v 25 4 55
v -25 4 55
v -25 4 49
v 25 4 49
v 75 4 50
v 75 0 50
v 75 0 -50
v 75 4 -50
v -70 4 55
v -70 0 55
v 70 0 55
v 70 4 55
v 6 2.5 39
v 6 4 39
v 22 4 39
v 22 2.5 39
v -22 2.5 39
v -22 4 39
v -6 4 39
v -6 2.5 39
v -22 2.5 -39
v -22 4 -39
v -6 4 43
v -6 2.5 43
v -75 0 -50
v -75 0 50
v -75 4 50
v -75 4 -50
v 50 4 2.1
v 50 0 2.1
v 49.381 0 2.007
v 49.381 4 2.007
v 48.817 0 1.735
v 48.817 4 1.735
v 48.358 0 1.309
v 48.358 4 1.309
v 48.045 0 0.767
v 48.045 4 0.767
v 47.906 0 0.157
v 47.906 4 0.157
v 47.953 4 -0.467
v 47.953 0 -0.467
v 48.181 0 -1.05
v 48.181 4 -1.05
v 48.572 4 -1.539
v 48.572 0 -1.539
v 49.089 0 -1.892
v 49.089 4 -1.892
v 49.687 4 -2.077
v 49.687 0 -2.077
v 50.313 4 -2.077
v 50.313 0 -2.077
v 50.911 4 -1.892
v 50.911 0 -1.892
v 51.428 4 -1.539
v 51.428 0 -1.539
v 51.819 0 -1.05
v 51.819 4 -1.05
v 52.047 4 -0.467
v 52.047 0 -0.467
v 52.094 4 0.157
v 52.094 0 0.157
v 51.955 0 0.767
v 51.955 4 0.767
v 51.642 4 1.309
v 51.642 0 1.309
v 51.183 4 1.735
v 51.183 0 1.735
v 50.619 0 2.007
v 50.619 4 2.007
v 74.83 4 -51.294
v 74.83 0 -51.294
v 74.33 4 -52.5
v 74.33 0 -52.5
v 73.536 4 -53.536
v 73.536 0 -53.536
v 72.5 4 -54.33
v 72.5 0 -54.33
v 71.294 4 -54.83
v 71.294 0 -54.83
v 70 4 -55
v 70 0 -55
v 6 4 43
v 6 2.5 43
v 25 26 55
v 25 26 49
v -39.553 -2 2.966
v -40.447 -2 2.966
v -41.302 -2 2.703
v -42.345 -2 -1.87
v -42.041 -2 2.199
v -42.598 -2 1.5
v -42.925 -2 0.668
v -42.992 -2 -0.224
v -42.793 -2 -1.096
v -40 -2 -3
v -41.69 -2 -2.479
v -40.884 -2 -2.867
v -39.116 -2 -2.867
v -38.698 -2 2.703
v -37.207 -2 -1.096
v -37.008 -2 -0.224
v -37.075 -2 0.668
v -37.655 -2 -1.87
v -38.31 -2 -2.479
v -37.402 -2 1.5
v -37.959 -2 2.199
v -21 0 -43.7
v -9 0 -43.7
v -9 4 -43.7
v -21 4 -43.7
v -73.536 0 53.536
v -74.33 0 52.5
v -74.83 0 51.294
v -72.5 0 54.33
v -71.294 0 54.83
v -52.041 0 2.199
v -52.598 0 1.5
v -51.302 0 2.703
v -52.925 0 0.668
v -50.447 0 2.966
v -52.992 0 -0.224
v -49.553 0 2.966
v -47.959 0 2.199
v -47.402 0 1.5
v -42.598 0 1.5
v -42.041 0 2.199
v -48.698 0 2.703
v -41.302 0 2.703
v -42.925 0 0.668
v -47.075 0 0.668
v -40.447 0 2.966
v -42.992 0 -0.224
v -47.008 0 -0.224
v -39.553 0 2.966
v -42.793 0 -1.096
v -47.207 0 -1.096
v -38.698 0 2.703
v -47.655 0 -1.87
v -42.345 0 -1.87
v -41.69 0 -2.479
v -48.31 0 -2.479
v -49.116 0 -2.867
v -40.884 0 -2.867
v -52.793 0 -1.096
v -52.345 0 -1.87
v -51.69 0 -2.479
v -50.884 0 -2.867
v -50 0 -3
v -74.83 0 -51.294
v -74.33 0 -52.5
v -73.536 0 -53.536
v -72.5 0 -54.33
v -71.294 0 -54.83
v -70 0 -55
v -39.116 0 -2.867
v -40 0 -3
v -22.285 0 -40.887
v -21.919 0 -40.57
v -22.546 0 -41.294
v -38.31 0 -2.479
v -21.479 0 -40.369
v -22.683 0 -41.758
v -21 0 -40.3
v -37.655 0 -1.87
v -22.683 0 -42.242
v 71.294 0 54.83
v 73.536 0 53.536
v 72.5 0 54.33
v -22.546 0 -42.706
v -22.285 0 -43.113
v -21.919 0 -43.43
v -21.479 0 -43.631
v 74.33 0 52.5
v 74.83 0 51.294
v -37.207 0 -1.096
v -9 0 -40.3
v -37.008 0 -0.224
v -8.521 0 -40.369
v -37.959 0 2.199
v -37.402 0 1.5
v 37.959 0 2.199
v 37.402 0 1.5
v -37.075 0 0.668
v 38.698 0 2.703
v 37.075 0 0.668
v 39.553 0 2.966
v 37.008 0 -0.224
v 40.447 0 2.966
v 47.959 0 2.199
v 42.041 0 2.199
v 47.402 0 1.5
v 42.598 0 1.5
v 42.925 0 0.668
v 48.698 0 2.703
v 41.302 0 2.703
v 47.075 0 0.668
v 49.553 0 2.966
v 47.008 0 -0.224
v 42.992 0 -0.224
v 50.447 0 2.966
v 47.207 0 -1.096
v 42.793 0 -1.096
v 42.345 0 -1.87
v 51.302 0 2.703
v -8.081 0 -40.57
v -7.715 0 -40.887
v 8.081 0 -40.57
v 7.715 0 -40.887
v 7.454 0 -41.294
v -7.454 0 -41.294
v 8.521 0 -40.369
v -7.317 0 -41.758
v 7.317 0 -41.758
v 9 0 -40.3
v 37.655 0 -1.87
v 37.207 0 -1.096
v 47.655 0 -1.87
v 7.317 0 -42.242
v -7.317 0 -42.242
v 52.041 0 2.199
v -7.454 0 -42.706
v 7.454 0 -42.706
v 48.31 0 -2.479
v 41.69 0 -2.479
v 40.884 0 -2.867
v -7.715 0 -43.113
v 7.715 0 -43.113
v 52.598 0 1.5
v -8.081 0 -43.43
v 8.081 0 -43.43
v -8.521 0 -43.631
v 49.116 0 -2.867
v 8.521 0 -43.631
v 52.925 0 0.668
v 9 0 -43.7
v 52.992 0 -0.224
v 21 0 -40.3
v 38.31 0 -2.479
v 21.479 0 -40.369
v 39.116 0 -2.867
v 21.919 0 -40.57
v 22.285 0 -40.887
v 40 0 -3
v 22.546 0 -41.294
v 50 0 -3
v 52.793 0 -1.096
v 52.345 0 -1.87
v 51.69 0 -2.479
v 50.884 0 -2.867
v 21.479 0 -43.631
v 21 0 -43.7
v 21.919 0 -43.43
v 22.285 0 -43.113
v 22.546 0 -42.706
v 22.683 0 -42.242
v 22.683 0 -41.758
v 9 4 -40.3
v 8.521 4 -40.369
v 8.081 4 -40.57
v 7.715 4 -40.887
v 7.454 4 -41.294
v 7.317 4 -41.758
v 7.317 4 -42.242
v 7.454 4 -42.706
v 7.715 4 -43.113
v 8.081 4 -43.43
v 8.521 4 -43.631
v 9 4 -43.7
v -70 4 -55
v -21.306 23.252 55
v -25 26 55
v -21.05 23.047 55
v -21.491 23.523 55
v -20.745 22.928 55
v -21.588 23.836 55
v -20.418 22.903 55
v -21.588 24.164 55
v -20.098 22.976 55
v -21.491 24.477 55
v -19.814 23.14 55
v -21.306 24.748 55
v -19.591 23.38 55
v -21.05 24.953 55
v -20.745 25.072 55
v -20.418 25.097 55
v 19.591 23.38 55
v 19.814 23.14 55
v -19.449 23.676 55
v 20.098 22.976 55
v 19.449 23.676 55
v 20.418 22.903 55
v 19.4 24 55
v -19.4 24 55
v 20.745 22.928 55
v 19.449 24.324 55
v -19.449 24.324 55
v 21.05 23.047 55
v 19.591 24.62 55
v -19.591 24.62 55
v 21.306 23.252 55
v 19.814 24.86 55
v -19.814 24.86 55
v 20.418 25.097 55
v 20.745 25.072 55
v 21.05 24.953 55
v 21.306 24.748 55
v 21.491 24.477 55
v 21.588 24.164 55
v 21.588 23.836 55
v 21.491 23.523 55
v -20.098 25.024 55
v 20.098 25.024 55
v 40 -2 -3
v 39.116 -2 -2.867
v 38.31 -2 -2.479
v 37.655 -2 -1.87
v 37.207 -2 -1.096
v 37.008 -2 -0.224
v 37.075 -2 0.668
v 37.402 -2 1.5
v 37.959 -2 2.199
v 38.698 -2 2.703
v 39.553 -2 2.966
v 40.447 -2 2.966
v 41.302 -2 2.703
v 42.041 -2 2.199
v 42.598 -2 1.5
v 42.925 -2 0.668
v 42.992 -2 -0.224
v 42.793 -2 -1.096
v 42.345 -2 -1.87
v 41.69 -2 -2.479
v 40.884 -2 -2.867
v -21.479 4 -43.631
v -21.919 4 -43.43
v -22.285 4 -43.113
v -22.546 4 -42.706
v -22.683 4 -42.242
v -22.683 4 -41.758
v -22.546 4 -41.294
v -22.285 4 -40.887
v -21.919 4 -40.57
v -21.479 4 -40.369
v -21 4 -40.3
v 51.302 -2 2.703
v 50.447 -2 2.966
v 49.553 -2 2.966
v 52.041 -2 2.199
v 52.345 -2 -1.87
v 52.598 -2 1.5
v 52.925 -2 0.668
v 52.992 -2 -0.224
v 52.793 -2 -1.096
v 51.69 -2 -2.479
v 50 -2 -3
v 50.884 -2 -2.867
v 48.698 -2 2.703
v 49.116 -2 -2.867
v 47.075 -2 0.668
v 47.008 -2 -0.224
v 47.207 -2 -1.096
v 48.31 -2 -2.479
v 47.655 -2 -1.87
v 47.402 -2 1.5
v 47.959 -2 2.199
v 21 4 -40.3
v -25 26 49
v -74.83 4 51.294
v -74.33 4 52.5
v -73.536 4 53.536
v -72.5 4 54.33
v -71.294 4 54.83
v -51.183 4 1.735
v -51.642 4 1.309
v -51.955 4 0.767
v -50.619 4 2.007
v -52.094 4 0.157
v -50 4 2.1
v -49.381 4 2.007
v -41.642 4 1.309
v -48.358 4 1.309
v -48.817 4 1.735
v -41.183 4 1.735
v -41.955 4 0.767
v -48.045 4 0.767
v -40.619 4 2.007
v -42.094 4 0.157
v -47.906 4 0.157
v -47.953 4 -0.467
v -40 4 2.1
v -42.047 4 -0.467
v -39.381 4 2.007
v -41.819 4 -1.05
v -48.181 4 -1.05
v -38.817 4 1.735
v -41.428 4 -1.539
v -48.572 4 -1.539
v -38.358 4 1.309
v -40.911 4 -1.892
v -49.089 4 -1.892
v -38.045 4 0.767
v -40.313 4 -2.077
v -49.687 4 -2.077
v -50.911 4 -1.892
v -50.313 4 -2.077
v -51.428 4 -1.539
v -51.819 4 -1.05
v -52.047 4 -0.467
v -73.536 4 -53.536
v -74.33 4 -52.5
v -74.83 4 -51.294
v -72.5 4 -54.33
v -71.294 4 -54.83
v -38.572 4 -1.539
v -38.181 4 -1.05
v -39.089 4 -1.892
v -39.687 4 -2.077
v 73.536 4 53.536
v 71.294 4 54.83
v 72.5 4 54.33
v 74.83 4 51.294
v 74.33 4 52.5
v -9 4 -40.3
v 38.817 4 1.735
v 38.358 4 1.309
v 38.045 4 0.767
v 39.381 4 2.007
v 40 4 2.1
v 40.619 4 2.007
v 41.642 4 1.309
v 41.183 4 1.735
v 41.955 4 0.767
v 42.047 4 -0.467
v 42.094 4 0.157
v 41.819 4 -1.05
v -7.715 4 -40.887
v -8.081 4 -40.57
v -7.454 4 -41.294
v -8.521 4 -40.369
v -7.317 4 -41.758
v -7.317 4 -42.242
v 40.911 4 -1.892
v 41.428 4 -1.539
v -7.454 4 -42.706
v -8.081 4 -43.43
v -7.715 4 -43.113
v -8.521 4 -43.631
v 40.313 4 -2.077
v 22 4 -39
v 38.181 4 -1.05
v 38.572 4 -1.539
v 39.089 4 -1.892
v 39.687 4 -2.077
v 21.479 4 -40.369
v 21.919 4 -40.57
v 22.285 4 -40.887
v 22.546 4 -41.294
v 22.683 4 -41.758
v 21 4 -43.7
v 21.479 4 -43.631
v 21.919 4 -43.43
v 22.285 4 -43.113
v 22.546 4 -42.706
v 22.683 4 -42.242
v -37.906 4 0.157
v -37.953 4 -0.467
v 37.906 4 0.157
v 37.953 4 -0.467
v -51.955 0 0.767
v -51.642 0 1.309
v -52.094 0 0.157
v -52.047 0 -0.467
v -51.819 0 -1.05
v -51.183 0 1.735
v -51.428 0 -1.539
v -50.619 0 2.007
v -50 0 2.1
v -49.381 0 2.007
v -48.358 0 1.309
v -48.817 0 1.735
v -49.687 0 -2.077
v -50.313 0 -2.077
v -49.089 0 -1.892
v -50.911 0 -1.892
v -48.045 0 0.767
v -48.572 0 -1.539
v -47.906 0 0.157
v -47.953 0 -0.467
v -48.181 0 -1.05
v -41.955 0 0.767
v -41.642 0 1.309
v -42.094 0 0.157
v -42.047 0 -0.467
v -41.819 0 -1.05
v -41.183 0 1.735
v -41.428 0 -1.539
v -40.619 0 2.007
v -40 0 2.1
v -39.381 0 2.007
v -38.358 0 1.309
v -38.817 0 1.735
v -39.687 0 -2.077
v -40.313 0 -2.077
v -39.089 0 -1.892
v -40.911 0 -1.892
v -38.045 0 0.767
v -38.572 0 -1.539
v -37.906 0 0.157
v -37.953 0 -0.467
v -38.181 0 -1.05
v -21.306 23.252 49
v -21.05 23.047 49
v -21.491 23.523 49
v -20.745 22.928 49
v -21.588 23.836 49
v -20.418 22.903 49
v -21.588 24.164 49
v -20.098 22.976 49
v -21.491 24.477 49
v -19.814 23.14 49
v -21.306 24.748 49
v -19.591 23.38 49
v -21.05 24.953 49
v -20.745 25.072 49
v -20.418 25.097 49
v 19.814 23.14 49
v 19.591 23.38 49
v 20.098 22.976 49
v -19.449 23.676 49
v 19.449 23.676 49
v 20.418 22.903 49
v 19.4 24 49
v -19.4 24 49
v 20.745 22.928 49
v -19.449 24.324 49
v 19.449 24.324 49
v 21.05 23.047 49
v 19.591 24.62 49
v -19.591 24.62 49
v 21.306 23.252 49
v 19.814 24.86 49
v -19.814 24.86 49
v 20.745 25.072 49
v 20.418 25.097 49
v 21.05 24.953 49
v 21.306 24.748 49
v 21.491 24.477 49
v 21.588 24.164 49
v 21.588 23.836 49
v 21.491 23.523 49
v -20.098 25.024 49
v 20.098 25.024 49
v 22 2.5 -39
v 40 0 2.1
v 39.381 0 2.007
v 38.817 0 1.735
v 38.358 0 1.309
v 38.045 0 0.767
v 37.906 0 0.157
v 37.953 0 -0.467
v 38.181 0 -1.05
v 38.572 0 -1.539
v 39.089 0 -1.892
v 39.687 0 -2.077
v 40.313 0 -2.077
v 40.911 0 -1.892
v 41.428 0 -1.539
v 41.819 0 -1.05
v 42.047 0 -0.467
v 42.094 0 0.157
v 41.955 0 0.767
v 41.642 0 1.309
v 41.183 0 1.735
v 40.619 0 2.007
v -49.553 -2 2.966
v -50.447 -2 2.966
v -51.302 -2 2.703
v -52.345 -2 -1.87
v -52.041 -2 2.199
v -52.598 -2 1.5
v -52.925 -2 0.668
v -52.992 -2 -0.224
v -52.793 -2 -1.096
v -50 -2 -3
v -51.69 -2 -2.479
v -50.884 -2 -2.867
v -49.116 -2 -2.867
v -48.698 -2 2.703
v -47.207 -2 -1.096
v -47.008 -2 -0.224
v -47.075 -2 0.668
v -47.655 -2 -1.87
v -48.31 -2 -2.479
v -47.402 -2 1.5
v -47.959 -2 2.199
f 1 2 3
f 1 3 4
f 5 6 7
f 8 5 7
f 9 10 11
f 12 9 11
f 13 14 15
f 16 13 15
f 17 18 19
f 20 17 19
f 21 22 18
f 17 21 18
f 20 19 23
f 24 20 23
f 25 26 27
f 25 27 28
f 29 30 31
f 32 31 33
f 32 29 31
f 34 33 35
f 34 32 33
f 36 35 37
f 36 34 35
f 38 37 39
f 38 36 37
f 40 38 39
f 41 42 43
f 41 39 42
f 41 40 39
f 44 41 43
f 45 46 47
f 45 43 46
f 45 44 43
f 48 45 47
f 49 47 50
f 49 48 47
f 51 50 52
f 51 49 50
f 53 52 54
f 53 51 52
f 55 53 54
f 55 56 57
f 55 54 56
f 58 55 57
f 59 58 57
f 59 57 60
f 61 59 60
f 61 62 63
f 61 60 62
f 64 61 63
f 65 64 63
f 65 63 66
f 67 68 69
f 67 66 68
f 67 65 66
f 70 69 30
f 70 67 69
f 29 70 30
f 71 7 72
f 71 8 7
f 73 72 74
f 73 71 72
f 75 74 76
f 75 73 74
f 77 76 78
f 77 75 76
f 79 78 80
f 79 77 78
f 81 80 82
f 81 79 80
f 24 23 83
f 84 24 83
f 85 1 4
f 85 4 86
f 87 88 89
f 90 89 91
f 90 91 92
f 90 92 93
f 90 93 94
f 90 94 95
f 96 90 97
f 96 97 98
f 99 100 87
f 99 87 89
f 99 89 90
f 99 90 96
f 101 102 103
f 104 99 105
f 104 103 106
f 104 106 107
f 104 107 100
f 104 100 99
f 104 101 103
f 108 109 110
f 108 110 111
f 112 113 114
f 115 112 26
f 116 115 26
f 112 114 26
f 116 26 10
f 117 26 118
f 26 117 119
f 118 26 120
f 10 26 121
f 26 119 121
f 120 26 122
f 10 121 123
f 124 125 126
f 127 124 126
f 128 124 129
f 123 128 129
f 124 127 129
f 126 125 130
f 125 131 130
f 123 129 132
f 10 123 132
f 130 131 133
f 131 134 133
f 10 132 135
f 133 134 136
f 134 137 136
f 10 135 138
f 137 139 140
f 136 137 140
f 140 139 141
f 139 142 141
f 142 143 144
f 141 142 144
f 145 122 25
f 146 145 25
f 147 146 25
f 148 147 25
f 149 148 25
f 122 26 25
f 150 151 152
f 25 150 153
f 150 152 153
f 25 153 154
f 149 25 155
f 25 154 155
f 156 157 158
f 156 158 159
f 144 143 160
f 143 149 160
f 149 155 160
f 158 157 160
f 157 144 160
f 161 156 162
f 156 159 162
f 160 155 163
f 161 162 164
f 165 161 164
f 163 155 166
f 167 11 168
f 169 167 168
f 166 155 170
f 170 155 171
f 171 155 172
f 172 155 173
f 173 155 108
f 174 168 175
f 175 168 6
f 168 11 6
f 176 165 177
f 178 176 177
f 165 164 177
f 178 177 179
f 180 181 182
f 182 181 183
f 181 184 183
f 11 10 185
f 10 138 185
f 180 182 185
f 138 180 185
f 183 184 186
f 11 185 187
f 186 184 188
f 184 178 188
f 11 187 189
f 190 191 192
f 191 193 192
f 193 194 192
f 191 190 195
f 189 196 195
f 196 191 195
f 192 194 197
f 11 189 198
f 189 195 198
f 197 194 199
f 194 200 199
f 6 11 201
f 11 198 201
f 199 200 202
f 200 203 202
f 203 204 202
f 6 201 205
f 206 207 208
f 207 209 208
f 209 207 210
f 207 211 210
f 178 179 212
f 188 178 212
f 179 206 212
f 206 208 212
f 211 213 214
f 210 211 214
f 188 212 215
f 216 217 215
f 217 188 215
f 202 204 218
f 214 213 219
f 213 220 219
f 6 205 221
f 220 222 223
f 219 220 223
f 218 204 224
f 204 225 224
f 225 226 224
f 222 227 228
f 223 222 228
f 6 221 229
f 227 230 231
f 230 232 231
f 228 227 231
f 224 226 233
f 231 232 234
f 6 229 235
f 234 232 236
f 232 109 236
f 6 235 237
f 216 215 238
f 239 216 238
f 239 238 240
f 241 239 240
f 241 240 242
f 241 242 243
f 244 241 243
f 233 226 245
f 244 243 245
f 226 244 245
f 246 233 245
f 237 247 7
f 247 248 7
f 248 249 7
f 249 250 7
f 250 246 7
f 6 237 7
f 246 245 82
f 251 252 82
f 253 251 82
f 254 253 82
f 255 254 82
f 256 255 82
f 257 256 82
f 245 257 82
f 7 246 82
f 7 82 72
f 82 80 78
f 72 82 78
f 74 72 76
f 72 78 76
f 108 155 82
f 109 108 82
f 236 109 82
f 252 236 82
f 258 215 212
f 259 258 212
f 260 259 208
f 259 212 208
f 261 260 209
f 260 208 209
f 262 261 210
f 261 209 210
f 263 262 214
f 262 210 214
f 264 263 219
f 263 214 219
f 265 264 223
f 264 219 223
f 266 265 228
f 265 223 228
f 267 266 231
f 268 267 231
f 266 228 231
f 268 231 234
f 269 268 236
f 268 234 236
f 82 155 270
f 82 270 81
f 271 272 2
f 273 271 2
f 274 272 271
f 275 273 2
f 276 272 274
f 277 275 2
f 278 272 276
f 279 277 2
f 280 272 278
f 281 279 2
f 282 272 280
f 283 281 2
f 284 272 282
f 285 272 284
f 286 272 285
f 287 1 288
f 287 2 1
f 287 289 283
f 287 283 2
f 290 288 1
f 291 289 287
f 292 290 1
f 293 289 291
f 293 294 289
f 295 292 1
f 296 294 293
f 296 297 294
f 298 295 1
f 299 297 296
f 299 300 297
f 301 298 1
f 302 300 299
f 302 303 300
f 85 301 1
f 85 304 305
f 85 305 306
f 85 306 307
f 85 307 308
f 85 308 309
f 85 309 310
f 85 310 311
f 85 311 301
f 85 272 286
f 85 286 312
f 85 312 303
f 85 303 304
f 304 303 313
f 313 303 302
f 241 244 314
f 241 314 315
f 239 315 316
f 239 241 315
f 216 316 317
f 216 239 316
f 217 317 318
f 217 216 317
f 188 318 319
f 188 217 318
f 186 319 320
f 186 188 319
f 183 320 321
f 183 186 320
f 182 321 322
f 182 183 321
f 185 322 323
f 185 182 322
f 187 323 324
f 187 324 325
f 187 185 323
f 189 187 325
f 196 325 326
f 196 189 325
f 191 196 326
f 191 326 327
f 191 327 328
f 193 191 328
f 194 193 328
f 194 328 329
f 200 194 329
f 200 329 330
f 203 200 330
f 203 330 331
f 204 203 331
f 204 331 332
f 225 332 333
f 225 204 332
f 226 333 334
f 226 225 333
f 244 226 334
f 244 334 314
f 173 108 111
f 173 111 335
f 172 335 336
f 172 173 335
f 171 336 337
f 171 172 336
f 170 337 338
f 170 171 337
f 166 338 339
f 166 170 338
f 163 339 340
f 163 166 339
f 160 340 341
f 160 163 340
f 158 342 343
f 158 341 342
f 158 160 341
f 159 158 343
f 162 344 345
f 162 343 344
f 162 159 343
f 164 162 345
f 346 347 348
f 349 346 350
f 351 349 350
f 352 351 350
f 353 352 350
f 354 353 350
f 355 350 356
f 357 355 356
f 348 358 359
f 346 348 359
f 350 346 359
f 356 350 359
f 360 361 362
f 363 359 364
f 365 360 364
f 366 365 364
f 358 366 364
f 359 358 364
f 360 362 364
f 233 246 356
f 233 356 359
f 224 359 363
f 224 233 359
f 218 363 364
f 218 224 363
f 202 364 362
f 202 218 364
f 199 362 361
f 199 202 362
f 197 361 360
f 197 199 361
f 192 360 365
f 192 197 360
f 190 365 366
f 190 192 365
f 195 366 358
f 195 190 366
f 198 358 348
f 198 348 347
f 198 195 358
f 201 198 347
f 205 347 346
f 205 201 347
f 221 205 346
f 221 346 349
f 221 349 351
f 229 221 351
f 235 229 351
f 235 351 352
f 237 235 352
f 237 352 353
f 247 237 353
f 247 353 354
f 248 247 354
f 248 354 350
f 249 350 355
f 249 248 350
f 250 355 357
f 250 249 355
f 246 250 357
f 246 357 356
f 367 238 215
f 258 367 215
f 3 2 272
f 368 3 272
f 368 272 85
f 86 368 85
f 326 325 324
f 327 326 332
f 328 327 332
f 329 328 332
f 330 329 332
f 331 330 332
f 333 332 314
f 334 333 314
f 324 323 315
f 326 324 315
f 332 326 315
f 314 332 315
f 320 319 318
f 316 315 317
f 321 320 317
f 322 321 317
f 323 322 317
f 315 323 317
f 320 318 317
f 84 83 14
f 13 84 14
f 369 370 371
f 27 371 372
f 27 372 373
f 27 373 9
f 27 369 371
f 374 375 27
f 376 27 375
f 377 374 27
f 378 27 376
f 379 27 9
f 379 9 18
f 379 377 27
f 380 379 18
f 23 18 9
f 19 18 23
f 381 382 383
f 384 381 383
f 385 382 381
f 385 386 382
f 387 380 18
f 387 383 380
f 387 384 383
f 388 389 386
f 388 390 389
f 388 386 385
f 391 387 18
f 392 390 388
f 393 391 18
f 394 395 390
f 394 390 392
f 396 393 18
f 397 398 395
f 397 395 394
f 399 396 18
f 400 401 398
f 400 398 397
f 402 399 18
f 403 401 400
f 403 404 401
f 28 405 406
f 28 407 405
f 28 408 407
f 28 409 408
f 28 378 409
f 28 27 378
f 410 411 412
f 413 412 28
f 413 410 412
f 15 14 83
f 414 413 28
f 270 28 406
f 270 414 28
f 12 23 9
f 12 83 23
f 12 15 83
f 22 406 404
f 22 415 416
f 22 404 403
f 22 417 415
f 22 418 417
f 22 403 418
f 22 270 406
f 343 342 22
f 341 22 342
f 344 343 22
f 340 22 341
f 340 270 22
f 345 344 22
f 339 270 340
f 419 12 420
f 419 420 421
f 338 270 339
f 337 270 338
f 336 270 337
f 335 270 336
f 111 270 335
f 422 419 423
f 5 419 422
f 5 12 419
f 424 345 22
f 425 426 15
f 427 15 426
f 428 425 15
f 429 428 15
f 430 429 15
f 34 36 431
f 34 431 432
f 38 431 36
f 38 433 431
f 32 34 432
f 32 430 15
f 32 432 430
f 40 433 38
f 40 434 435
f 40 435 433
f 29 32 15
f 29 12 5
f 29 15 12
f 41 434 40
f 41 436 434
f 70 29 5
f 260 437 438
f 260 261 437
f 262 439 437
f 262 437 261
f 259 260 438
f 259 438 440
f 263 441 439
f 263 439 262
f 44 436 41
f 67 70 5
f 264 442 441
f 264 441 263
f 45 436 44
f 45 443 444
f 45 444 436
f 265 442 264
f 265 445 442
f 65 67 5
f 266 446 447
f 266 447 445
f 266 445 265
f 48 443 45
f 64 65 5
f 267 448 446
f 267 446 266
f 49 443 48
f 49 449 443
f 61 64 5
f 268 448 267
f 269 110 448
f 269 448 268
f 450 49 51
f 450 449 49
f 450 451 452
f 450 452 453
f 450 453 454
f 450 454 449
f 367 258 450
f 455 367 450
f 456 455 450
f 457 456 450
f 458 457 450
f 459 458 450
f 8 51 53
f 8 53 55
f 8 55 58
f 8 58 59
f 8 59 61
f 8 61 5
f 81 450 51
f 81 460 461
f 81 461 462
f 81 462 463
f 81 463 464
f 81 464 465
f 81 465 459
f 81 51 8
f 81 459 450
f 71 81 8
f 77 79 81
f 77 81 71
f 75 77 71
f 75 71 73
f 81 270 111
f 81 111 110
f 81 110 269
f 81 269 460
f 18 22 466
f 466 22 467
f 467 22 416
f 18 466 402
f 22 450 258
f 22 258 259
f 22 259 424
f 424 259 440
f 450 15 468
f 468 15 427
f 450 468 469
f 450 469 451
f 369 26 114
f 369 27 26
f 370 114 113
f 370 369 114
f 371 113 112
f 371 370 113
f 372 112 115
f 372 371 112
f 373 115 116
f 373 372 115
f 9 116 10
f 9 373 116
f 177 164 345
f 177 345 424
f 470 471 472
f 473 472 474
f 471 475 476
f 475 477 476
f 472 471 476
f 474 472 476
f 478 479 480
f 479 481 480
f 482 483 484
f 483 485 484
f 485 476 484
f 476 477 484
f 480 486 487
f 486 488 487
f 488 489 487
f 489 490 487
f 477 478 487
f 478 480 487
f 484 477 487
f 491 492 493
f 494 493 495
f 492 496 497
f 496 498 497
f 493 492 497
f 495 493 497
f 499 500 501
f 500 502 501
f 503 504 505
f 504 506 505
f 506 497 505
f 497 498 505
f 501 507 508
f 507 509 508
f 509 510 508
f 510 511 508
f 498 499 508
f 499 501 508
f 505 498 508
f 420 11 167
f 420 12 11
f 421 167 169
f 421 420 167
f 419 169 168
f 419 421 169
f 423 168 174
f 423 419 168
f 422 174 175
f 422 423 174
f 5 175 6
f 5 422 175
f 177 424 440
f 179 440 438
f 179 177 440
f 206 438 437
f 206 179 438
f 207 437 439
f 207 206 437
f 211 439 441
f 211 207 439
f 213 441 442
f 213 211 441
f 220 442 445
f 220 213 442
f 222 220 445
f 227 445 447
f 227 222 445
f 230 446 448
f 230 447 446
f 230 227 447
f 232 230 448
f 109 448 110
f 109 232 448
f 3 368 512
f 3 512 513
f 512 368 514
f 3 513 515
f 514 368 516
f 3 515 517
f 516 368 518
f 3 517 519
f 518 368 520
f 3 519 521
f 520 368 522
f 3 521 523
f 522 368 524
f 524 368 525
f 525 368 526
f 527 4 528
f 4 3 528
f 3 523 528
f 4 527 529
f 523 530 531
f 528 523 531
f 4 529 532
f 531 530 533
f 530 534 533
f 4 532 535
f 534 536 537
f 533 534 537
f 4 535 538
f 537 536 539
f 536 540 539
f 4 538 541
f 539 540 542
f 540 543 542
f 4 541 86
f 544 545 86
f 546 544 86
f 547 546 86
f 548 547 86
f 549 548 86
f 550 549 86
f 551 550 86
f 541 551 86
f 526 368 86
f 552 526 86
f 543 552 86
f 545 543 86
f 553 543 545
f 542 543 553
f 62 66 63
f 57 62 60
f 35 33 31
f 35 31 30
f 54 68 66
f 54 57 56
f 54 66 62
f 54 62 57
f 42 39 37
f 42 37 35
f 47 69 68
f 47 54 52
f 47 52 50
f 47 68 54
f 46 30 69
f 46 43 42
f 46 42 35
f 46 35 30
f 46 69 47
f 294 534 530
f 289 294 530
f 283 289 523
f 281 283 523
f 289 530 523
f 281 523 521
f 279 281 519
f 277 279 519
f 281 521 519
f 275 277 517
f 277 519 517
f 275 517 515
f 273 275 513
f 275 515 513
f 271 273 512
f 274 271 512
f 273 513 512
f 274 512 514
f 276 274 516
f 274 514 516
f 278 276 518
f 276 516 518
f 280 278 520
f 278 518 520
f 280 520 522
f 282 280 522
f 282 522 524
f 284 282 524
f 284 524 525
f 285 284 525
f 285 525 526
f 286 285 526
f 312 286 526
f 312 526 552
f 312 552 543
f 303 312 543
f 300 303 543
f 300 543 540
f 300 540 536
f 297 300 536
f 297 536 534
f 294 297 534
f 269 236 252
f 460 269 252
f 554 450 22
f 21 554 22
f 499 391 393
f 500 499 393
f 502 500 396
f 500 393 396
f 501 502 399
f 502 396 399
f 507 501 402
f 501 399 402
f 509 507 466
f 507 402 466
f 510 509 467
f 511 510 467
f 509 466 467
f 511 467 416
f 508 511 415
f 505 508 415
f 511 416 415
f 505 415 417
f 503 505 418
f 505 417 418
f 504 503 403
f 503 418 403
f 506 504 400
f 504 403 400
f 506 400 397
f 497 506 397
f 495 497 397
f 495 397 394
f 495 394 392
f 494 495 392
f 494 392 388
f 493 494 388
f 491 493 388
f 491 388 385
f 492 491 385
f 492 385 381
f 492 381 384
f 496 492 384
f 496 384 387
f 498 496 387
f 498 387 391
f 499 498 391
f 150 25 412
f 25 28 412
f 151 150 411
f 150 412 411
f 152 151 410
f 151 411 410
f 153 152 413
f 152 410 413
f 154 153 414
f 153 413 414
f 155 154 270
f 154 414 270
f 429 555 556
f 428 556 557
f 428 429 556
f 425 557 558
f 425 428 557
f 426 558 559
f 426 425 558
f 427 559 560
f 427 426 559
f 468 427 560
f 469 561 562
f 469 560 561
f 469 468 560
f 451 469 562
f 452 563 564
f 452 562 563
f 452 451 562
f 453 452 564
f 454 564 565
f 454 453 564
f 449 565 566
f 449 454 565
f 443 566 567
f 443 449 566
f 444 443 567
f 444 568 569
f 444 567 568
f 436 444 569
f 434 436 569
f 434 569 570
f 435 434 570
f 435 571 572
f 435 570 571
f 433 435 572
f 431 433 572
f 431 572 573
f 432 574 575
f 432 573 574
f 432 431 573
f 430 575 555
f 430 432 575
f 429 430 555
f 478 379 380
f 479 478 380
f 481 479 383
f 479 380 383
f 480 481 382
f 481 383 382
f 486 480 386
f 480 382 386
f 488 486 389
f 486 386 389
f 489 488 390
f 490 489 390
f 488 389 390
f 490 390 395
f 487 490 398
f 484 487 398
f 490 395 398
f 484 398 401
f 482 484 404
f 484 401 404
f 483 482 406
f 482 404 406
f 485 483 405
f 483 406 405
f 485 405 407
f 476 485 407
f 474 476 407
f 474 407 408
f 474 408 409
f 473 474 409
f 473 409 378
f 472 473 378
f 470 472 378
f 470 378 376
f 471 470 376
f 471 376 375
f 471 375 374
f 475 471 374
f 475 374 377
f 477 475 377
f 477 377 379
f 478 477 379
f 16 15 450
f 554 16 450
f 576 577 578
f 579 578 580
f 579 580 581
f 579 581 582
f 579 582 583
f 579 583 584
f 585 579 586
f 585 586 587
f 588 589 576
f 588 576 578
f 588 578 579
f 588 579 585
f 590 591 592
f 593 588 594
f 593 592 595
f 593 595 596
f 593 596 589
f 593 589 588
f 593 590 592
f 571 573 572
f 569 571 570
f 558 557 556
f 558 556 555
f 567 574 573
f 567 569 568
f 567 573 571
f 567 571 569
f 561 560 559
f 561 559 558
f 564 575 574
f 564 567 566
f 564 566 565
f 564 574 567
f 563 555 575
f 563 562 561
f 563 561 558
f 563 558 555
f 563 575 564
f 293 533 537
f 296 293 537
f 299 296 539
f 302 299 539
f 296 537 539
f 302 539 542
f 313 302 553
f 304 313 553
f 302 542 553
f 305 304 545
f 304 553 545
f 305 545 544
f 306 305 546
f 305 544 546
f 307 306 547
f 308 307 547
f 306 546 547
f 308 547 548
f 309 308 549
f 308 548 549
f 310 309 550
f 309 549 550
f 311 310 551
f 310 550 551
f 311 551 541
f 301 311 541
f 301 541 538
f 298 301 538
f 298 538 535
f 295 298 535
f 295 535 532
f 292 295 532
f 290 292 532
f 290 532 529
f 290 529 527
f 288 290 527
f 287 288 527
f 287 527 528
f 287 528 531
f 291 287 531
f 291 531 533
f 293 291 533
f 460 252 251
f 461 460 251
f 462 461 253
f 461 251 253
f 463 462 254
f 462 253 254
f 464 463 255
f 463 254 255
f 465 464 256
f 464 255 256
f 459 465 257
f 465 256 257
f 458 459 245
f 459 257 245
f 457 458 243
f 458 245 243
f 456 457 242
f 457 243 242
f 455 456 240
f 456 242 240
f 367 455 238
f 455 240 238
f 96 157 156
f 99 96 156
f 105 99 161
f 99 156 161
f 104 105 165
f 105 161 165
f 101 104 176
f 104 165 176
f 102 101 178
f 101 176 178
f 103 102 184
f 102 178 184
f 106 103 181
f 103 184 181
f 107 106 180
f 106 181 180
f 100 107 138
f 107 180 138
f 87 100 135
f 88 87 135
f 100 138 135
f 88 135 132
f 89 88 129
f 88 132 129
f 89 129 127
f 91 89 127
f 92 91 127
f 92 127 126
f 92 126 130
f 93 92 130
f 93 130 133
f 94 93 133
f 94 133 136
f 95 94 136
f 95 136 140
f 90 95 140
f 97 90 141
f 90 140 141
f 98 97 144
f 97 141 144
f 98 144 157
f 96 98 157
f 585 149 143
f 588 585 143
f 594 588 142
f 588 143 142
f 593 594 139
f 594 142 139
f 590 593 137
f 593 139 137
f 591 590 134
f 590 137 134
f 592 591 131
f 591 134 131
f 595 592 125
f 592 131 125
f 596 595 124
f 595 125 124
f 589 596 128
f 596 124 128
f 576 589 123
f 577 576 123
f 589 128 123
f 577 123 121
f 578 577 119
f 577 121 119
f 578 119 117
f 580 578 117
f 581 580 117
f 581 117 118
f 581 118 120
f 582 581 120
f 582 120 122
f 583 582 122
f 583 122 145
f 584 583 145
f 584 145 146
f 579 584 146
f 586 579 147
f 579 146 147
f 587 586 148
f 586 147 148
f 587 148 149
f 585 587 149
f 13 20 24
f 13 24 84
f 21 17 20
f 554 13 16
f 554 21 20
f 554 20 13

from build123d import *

# Parameters (mm, degrees)
SKETCH1_W           = 150
SKETCH1_H           = 110
BOSS_EXTRUDE1_DEPTH = 4
FILLET1_R           = 5
SKETCH2_R           = 2.1
CUT_EXTRUDE1_DEPTH  = 94.091352982
SKETCH3_R           = 3
BOSS_EXTRUDE2_DEPTH = 2
CUT_EXTRUDE2_DEPTH  = 1.5
SKETCH7_W           = 50
SKETCH7_H           = 22
BOSS_EXTRUDE4_DEPTH = 6
SKETCH8_R           = 1.1
CUT_EXTRUDE3_DEPTH  = 131.831953284
CUT_EXTRUDE4_DEPTH  = 97.571217244


with BuildPart() as part:
    # Sketch1 → Boss-Extrude1 (new body)
    with BuildSketch(Plane(origin=(0, 0, 0), x_dir=(1, 0, 0), z_dir=(0, 1, 0))):
        Rectangle(SKETCH1_W, SKETCH1_H)
    extrude(amount=BOSS_EXTRUDE1_DEPTH)

    # Fillet1
    fillet1_edges = [part.edges().sort_by_distance(p)[0] for p in [
        (75, 2, 55),
        (-75, 2, 55),
        (-75, 2, -55),
        (75, 2, -55),
    ]]
    fillet(fillet1_edges, radius=FILLET1_R)

    # Sketch2 → Cut-Extrude1 (cut, through all)
    with BuildSketch(Plane(origin=(0, 4, 0), x_dir=(1, 0, 0), z_dir=(0, 1, 0))):
        with Locations(Location((-50, 0, 0), (0, 0, 270))):
            Circle(SKETCH2_R)
        with Locations(Location((-40, 0, 0), (0, 0, 270))):
            Circle(SKETCH2_R)
    cut_extrude1 = extrude(amount=-CUT_EXTRUDE1_DEPTH, mode=Mode.SUBTRACT)

    # Sketch3 → Boss-Extrude2 (add)
    with BuildSketch(Plane.XZ):
        with Locations(Location((-50, 0, 0), (0, 0, 270))):
            Circle(SKETCH3_R)
        with Locations(Location((-40, 0, 0), (0, 0, 270))):
            Circle(SKETCH3_R)
    boss_extrude2 = extrude(amount=BOSS_EXTRUDE2_DEPTH)

    # Mirror1: Cut-Extrude1, Boss-Extrude2 across plane
    add(cut_extrude1.mirror(Plane(origin=(0, 0, 0), x_dir=(0, 0, 1), z_dir=(1, 0, 0))), mode=Mode.SUBTRACT)
    add(boss_extrude2.mirror(Plane(origin=(0, 0, 0), x_dir=(0, 0, 1), z_dir=(1, 0, 0))))

    # Sketch4 → Cut-Extrude2 (cut)
    with BuildSketch(Plane(origin=(0, 4, 0), x_dir=(1, 0, 0), z_dir=(0, 1, 0))):
        Polygon((-22, -39), (-6, -39), (-6, -43), (6, -43), (6, -39), (22, -39), (22, 39), (-22, 39), align=None)
    extrude(amount=-CUT_EXTRUDE2_DEPTH, mode=Mode.SUBTRACT)

    # Sketch9 → Cut-Extrude4 (cut, through all)
    with BuildSketch(Plane.XZ):
        with BuildLine():
            Line((-21, -40.3), (-9, -40.3))
            ThreePointArc((-9, -40.3), (-7.3, -42), (-9, -43.7))
            Line((-9, -43.7), (-21, -43.7))
            ThreePointArc((-21, -43.7), (-22.7, -42), (-21, -40.3))
        make_face()
        with BuildLine():
            Line((21, -40.3), (9, -40.3))
            ThreePointArc((9, -40.3), (7.3, -42), (9, -43.7))
            Line((9, -43.7), (21, -43.7))
            ThreePointArc((21, -43.7), (22.7, -42), (21, -40.3))
        make_face()
    extrude(amount=-CUT_EXTRUDE4_DEPTH, mode=Mode.SUBTRACT)


with BuildPart() as body_2:
    # Sketch7 → Boss-Extrude4 (new body)
    with BuildSketch(Plane.XY.offset(55)):
        with Locations((0, 15)):
            Rectangle(SKETCH7_W, SKETCH7_H)
    extrude(amount=-BOSS_EXTRUDE4_DEPTH)

    # Sketch8 → Cut-Extrude3 (cut, through all)
    with BuildSketch(Plane(origin=(0, 0, 49), x_dir=(-1, 0, 0), z_dir=(0, 0, -1))):
        with Locations((-20.5, 24)):
            Circle(SKETCH8_R)
        with Locations(Location((20.5, 24, 0), (0, 0, 180))):
            Circle(SKETCH8_R)
    extrude(amount=-CUT_EXTRUDE3_DEPTH, mode=Mode.SUBTRACT)


solid = Compound([part.part, body_2.part])
